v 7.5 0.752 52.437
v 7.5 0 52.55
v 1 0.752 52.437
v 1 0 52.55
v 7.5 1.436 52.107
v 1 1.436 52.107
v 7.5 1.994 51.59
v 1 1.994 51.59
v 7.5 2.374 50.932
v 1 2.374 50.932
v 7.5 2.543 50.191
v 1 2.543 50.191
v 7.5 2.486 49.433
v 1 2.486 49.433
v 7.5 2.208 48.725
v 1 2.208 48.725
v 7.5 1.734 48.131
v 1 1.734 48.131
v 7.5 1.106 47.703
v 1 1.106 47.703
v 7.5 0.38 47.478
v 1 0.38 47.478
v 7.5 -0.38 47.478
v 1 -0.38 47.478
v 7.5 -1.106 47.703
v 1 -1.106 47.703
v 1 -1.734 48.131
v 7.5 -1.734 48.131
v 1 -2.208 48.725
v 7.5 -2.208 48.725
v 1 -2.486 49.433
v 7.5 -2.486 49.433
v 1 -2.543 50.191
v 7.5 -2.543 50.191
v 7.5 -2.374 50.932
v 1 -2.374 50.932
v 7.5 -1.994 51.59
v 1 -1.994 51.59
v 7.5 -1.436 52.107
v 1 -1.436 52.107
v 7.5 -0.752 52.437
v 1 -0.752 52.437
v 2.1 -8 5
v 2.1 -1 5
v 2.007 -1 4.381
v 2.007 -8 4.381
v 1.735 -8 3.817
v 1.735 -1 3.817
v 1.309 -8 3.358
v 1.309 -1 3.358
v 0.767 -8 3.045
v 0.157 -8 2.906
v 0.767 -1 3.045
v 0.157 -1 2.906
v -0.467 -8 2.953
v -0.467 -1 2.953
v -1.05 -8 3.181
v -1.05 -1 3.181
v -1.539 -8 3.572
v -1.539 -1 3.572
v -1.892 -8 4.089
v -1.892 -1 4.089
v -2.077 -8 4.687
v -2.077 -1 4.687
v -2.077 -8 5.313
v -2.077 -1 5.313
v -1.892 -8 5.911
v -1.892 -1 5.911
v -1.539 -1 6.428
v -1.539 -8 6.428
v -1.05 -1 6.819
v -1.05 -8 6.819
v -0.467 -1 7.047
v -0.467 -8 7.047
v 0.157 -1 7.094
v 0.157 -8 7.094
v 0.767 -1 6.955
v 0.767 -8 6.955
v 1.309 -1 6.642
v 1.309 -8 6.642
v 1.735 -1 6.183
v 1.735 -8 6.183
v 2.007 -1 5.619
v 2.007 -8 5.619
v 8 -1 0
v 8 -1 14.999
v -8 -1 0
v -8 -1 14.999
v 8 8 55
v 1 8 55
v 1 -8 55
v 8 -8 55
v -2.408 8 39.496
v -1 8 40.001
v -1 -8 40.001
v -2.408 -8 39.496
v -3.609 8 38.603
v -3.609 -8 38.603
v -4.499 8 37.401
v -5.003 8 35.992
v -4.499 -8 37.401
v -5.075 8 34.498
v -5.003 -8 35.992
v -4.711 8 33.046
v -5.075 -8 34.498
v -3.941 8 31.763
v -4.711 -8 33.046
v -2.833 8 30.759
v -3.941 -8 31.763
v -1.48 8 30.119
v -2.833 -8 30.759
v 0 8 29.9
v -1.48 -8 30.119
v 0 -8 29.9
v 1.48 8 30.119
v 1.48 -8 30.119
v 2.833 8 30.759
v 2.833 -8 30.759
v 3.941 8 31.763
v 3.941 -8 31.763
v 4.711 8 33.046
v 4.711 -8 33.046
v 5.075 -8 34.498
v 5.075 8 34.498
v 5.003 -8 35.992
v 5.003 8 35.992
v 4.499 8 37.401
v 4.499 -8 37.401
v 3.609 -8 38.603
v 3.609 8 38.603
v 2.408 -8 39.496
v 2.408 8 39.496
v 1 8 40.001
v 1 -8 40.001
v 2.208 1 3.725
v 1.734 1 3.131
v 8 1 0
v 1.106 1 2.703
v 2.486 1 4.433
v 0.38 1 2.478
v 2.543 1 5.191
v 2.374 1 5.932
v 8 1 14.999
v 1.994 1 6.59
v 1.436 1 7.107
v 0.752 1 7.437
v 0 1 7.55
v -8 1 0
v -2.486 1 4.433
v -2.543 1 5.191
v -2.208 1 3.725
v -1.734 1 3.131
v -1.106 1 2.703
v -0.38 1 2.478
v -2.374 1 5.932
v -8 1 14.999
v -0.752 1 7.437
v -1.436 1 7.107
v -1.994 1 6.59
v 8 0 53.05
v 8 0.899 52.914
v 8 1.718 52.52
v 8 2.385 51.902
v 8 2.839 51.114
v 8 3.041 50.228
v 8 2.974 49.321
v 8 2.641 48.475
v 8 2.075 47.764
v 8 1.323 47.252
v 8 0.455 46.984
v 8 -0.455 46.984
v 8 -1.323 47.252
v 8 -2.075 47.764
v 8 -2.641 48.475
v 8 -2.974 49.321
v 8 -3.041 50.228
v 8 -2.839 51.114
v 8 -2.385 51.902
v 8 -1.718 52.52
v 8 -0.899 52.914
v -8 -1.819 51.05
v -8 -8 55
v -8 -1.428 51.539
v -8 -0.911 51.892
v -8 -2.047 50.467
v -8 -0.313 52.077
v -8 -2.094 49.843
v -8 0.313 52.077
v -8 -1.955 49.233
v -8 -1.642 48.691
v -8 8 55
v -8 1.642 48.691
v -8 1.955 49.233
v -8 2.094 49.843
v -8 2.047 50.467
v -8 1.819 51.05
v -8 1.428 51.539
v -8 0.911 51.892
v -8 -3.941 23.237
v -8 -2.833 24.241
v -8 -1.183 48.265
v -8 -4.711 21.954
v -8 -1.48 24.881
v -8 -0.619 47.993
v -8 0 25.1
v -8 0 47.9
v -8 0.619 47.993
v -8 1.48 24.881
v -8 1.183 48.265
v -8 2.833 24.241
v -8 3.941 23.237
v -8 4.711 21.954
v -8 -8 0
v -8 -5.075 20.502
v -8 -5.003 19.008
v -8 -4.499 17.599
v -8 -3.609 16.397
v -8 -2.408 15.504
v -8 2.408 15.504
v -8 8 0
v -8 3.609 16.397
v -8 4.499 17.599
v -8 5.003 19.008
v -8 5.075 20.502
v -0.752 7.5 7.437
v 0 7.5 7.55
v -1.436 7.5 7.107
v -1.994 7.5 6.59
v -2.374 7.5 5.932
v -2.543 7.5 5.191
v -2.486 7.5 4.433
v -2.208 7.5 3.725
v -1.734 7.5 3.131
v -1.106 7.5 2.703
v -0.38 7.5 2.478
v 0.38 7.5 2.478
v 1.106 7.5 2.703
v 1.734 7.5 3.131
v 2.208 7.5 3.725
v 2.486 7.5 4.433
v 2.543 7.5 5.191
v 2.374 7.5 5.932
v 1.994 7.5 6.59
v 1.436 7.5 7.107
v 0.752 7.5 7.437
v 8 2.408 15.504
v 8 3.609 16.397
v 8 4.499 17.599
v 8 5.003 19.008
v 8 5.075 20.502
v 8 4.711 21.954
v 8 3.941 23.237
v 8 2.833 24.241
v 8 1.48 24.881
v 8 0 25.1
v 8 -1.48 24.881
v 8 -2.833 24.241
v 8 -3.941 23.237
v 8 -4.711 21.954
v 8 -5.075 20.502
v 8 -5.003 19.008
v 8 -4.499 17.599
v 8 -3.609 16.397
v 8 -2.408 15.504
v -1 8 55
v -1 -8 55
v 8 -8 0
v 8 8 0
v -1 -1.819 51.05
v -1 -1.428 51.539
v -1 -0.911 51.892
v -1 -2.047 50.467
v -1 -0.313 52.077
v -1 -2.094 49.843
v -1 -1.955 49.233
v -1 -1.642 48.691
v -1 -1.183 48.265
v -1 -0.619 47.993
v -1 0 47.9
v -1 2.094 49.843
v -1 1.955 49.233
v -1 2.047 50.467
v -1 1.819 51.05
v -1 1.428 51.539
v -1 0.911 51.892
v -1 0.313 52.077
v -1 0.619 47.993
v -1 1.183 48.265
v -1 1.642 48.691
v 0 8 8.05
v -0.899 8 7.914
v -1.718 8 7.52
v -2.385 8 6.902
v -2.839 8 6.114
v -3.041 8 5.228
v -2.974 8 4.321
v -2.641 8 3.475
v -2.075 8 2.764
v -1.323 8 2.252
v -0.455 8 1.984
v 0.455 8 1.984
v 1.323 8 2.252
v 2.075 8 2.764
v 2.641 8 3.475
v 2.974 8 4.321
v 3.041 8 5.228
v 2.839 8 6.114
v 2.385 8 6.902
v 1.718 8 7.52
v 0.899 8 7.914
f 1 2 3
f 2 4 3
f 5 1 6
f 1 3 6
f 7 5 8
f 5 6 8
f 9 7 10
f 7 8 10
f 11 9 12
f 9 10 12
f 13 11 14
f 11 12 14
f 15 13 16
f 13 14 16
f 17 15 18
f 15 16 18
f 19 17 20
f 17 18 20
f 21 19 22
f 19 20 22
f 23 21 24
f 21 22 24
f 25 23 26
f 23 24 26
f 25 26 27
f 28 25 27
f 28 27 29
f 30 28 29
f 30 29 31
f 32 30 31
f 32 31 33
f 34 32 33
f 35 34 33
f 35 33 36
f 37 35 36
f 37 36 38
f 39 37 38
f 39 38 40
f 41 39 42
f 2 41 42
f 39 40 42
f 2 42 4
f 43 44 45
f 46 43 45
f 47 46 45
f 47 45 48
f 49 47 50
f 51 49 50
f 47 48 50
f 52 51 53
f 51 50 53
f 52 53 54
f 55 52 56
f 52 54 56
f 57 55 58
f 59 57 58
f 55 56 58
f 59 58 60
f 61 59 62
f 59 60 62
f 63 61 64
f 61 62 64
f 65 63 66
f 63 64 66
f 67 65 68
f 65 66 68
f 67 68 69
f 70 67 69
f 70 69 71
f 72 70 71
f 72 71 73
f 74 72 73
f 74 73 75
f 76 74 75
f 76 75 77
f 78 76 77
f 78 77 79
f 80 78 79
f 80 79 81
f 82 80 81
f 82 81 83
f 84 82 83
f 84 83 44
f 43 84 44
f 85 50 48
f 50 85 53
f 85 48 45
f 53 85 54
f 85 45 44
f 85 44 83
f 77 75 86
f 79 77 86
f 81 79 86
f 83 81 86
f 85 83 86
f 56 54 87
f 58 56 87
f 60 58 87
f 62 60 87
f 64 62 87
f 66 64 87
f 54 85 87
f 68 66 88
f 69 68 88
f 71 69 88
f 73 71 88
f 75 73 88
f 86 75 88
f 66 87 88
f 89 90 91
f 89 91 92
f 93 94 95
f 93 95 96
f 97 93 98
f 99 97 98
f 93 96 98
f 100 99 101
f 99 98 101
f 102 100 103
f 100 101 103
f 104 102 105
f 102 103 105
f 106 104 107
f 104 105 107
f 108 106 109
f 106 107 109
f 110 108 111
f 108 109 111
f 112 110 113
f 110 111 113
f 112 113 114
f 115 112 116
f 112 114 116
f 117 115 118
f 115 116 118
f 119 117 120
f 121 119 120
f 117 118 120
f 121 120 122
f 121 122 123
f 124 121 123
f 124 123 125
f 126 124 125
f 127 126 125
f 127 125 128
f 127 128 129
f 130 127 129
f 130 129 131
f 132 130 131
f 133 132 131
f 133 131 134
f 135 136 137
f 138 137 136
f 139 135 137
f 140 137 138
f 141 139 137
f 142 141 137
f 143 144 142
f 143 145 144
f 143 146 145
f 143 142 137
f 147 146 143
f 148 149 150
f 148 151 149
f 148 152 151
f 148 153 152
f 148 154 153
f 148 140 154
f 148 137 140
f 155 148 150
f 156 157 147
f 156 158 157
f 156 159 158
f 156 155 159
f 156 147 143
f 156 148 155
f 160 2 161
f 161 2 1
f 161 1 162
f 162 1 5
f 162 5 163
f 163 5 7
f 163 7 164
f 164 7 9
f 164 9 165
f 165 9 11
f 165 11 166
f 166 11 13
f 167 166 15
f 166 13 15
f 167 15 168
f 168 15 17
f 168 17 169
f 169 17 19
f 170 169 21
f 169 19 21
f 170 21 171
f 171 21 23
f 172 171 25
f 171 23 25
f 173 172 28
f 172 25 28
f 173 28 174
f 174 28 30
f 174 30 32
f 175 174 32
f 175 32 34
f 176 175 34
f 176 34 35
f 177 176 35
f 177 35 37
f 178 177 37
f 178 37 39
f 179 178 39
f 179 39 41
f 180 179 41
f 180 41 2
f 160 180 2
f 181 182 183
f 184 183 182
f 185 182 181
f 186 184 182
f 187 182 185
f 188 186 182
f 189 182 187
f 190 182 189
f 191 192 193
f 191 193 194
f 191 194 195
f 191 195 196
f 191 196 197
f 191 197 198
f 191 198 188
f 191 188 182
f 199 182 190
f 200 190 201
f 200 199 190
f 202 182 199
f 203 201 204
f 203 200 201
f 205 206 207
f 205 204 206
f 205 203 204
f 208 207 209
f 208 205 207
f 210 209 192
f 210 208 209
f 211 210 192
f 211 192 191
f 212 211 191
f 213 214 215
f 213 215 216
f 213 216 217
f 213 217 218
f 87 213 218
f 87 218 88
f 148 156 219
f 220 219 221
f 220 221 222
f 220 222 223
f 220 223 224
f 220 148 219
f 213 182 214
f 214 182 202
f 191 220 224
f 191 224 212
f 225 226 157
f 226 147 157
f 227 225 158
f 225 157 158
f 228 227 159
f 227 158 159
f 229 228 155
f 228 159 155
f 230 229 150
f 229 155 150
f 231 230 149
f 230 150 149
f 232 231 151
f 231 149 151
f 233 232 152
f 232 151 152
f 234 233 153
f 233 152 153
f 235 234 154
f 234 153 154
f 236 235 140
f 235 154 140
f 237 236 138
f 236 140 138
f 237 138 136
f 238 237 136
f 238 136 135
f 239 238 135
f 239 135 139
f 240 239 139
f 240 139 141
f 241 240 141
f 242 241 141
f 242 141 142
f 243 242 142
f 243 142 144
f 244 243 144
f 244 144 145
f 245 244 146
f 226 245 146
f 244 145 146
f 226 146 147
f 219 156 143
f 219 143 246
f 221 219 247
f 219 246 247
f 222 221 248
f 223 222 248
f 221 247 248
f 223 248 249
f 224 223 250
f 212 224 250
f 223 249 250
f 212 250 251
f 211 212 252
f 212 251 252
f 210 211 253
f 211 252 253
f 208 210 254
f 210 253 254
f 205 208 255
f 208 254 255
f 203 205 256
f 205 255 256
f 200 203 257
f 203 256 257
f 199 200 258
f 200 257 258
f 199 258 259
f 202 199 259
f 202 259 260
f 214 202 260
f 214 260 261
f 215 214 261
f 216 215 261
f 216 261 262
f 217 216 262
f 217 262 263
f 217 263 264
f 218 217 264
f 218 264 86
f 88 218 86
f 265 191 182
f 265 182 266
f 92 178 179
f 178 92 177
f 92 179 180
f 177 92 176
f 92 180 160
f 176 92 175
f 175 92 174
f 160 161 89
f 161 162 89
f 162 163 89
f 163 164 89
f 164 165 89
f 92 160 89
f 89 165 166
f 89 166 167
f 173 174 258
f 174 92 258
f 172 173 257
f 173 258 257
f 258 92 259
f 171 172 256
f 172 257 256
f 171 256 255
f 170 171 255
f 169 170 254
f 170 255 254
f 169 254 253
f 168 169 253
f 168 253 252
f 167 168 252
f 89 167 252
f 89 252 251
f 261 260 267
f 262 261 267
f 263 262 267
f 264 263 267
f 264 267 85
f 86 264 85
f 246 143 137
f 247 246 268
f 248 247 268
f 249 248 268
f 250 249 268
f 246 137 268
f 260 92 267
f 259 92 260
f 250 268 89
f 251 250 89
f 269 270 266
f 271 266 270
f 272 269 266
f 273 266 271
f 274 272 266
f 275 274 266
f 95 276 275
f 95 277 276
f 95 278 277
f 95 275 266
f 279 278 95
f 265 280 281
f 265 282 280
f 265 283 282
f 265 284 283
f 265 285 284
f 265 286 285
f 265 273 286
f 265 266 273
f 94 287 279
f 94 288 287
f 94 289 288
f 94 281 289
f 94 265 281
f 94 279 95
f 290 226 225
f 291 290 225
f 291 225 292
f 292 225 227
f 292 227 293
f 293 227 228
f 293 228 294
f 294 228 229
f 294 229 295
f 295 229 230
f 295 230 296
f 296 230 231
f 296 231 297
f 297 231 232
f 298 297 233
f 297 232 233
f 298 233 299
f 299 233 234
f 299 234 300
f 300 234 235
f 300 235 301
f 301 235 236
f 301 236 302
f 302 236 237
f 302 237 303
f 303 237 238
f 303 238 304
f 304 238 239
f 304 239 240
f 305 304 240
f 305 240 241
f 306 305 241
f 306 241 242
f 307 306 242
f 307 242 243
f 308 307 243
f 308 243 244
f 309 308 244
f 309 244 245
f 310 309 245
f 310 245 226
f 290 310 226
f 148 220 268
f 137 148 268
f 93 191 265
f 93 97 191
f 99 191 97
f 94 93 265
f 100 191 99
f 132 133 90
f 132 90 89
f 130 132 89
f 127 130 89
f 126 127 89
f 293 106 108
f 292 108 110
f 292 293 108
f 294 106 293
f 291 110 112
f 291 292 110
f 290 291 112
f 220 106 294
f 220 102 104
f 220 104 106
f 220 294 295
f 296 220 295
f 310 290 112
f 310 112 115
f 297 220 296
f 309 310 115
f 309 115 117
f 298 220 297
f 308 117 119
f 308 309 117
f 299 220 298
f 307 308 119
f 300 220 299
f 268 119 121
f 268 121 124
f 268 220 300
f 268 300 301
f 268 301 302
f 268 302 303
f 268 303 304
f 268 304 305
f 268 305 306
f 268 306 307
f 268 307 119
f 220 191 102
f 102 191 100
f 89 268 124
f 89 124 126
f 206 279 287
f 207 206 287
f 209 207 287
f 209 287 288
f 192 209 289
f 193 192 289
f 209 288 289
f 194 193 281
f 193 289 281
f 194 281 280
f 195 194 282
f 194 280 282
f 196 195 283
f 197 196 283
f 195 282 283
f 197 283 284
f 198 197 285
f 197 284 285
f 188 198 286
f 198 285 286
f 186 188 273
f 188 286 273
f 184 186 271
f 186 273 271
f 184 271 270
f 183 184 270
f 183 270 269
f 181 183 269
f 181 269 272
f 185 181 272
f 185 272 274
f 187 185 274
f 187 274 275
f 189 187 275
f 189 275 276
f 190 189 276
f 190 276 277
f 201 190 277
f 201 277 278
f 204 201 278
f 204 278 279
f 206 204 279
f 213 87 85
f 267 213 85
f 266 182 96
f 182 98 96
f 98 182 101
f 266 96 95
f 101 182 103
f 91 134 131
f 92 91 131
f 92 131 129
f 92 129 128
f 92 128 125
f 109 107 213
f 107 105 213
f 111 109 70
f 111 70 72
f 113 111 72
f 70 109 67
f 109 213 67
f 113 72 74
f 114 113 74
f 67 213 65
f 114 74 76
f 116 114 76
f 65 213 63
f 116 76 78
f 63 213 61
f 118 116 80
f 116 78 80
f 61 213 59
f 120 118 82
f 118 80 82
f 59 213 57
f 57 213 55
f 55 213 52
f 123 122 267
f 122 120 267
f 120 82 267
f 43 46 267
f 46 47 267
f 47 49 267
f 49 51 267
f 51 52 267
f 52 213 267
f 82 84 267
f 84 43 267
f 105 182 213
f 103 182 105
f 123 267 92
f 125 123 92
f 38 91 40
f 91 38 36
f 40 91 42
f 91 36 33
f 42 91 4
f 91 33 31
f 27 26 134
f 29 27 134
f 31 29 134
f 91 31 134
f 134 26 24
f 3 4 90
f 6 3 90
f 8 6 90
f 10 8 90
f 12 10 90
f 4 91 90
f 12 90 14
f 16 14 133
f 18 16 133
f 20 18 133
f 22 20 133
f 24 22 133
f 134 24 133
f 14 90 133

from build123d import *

# Parameters (mm, degrees)
SKETCH1_W                                 = 16
SKETCH1_H                                 = 16
BASE_DEPTH                                = 55
SKETCH2_W                                 = 2
SKETCH2_H                                 = 16
RODSLOT_DEPTH                             = 17
F_5_1_5_1_FREE_HOLE_FOR_SCREW_D           = 5.1
F_5_1_5_1_FREE_HOLE_FOR_SCREW_DEPTH       = 7.5
F_5_1_5_1_FREE_HOLE_FOR_SCREW_CSINK_D     = 6.1
F_5_1_5_1_FREE_HOLE_FOR_SCREW_CSINK_ANGLE = 90
F_5_1_5_1_FREE_HOLE_FOR_SCREW_TIP         = 1.056244584
M5X0_8_TAPPED_HOLE_FOR_ROD_SCREW_D        = 4.2
M5X0_8_TAPPED_HOLE_FOR_ROD_SCREW_DEPTH    = 7.6381927
M5X0_8_TAPPED_HOLE_FOR_ROD_SCREW_TIP      = 1.2618073
F_10_2_10_2_ROD_HOLE_D                    = 10.2
SKETCH13_W                                = 20
SKETCH13_H                                = 2
ROD2SLOT_DEPTH                            = 17
F_10_2_10_2_ROD2_HOLE_D                   = 10.2
F_5_1_5_1_DIAMETER_HOLE1_D                = 5.1
F_5_1_5_1_DIAMETER_HOLE1_DEPTH            = 7.5
F_5_1_5_1_DIAMETER_HOLE1_CSINK_D          = 6.1
F_5_1_5_1_DIAMETER_HOLE1_CSINK_ANGLE      = 90
F_5_1_5_1_DIAMETER_HOLE1_TIP              = 1.056244584
M5X0_8_TAPPED_HOLE1_D                     = 4.2
M5X0_8_TAPPED_HOLE1_DEPTH                 = 7.6381927
M5X0_8_TAPPED_HOLE1_TIP                   = 1.2618073


with BuildPart() as part:
    # Sketch1 → Base (new body)
    with BuildSketch(Plane.XY):
        Rectangle(SKETCH1_W, SKETCH1_H)
    extrude(amount=BASE_DEPTH)

    # Sketch2 → RodSlot (cut, through all)
    with BuildSketch(Plane(origin=(0, 8, 0), x_dir=(1, 0, 0), z_dir=(0, 1, 0))):
        with Locations((0, -47)):
            Rectangle(SKETCH2_W, SKETCH2_H)
    extrude(amount=-RODSLOT_DEPTH, mode=Mode.SUBTRACT)

    # Ø5.1 (5.1) free hole for screw
    with Locations(Plane(origin=(8, 0, 0), x_dir=(0, 0, -1), z_dir=(1, 0, 0))):
        with Locations((-50, 0)):
            CounterSinkHole(F_5_1_5_1_FREE_HOLE_FOR_SCREW_D / 2, F_5_1_5_1_FREE_HOLE_FOR_SCREW_CSINK_D / 2, depth=F_5_1_5_1_FREE_HOLE_FOR_SCREW_DEPTH, counter_sink_angle=F_5_1_5_1_FREE_HOLE_FOR_SCREW_CSINK_ANGLE)
            with Locations((0, 0, -(F_5_1_5_1_FREE_HOLE_FOR_SCREW_DEPTH + F_5_1_5_1_FREE_HOLE_FOR_SCREW_TIP / 2))):  # 135° drill point
                Cone(0, F_5_1_5_1_FREE_HOLE_FOR_SCREW_D / 2, F_5_1_5_1_FREE_HOLE_FOR_SCREW_TIP, mode=Mode.SUBTRACT)

    # M5x0.8 Tapped Hole for rod screw
    with Locations(Plane.ZY.offset(8)):
        with Locations((50, 0)):
            Hole(M5X0_8_TAPPED_HOLE_FOR_ROD_SCREW_D / 2, depth=M5X0_8_TAPPED_HOLE_FOR_ROD_SCREW_DEPTH)
            with Locations((0, 0, -(M5X0_8_TAPPED_HOLE_FOR_ROD_SCREW_DEPTH + M5X0_8_TAPPED_HOLE_FOR_ROD_SCREW_TIP / 2))):  # 118° drill point
                Cone(0, M5X0_8_TAPPED_HOLE_FOR_ROD_SCREW_D / 2, M5X0_8_TAPPED_HOLE_FOR_ROD_SCREW_TIP, mode=Mode.SUBTRACT)

    # Ø10.2 (10.2) Rod Hole (through all)
    with Locations(Plane(origin=(0, 8, 0), x_dir=(1, 0, 0), z_dir=(0, 1, 0))):
        with Locations((0, -35)):
            Hole(F_10_2_10_2_ROD_HOLE_D / 2)

    # Sketch13 → Rod2Slot (cut, through all)
    with BuildSketch(Plane.ZY.offset(8)):
        with Locations((10, 0)):
            Rectangle(SKETCH13_W, SKETCH13_H)
    extrude(amount=-ROD2SLOT_DEPTH, mode=Mode.SUBTRACT)

    # Ø10.2 (10.2) Rod2 Hole (through all)
    with Locations(Plane(origin=(-8, 0, 0), x_dir=(0, 1, 0), z_dir=(-1, 0, 0))):
        with Locations((0, -20)):
            Hole(F_10_2_10_2_ROD2_HOLE_D / 2)

    # Ø5.1 (5.1) Diameter Hole1
    with Locations(Plane(origin=(0, 8, 0), x_dir=(0, 0, -1), z_dir=(0, 1, 0))):
        with Locations((-5, 0)):
            CounterSinkHole(F_5_1_5_1_DIAMETER_HOLE1_D / 2, F_5_1_5_1_DIAMETER_HOLE1_CSINK_D / 2, depth=F_5_1_5_1_DIAMETER_HOLE1_DEPTH, counter_sink_angle=F_5_1_5_1_DIAMETER_HOLE1_CSINK_ANGLE)
            with Locations((0, 0, -(F_5_1_5_1_DIAMETER_HOLE1_DEPTH + F_5_1_5_1_DIAMETER_HOLE1_TIP / 2))):  # 135° drill point
                Cone(0, F_5_1_5_1_DIAMETER_HOLE1_D / 2, F_5_1_5_1_DIAMETER_HOLE1_TIP, mode=Mode.SUBTRACT)

    # M5x0.8 Tapped Hole1
    with Locations(Plane(origin=(0, -8, 0), x_dir=(-1, 0, 0), z_dir=(0, -1, 0))):
        with Locations((0, -5)):
            Hole(M5X0_8_TAPPED_HOLE1_D / 2, depth=M5X0_8_TAPPED_HOLE1_DEPTH)
            with Locations((0, 0, -(M5X0_8_TAPPED_HOLE1_DEPTH + M5X0_8_TAPPED_HOLE1_TIP / 2))):  # 118° drill point
                Cone(0, M5X0_8_TAPPED_HOLE1_D / 2, M5X0_8_TAPPED_HOLE1_TIP, mode=Mode.SUBTRACT)


solid = part.part
